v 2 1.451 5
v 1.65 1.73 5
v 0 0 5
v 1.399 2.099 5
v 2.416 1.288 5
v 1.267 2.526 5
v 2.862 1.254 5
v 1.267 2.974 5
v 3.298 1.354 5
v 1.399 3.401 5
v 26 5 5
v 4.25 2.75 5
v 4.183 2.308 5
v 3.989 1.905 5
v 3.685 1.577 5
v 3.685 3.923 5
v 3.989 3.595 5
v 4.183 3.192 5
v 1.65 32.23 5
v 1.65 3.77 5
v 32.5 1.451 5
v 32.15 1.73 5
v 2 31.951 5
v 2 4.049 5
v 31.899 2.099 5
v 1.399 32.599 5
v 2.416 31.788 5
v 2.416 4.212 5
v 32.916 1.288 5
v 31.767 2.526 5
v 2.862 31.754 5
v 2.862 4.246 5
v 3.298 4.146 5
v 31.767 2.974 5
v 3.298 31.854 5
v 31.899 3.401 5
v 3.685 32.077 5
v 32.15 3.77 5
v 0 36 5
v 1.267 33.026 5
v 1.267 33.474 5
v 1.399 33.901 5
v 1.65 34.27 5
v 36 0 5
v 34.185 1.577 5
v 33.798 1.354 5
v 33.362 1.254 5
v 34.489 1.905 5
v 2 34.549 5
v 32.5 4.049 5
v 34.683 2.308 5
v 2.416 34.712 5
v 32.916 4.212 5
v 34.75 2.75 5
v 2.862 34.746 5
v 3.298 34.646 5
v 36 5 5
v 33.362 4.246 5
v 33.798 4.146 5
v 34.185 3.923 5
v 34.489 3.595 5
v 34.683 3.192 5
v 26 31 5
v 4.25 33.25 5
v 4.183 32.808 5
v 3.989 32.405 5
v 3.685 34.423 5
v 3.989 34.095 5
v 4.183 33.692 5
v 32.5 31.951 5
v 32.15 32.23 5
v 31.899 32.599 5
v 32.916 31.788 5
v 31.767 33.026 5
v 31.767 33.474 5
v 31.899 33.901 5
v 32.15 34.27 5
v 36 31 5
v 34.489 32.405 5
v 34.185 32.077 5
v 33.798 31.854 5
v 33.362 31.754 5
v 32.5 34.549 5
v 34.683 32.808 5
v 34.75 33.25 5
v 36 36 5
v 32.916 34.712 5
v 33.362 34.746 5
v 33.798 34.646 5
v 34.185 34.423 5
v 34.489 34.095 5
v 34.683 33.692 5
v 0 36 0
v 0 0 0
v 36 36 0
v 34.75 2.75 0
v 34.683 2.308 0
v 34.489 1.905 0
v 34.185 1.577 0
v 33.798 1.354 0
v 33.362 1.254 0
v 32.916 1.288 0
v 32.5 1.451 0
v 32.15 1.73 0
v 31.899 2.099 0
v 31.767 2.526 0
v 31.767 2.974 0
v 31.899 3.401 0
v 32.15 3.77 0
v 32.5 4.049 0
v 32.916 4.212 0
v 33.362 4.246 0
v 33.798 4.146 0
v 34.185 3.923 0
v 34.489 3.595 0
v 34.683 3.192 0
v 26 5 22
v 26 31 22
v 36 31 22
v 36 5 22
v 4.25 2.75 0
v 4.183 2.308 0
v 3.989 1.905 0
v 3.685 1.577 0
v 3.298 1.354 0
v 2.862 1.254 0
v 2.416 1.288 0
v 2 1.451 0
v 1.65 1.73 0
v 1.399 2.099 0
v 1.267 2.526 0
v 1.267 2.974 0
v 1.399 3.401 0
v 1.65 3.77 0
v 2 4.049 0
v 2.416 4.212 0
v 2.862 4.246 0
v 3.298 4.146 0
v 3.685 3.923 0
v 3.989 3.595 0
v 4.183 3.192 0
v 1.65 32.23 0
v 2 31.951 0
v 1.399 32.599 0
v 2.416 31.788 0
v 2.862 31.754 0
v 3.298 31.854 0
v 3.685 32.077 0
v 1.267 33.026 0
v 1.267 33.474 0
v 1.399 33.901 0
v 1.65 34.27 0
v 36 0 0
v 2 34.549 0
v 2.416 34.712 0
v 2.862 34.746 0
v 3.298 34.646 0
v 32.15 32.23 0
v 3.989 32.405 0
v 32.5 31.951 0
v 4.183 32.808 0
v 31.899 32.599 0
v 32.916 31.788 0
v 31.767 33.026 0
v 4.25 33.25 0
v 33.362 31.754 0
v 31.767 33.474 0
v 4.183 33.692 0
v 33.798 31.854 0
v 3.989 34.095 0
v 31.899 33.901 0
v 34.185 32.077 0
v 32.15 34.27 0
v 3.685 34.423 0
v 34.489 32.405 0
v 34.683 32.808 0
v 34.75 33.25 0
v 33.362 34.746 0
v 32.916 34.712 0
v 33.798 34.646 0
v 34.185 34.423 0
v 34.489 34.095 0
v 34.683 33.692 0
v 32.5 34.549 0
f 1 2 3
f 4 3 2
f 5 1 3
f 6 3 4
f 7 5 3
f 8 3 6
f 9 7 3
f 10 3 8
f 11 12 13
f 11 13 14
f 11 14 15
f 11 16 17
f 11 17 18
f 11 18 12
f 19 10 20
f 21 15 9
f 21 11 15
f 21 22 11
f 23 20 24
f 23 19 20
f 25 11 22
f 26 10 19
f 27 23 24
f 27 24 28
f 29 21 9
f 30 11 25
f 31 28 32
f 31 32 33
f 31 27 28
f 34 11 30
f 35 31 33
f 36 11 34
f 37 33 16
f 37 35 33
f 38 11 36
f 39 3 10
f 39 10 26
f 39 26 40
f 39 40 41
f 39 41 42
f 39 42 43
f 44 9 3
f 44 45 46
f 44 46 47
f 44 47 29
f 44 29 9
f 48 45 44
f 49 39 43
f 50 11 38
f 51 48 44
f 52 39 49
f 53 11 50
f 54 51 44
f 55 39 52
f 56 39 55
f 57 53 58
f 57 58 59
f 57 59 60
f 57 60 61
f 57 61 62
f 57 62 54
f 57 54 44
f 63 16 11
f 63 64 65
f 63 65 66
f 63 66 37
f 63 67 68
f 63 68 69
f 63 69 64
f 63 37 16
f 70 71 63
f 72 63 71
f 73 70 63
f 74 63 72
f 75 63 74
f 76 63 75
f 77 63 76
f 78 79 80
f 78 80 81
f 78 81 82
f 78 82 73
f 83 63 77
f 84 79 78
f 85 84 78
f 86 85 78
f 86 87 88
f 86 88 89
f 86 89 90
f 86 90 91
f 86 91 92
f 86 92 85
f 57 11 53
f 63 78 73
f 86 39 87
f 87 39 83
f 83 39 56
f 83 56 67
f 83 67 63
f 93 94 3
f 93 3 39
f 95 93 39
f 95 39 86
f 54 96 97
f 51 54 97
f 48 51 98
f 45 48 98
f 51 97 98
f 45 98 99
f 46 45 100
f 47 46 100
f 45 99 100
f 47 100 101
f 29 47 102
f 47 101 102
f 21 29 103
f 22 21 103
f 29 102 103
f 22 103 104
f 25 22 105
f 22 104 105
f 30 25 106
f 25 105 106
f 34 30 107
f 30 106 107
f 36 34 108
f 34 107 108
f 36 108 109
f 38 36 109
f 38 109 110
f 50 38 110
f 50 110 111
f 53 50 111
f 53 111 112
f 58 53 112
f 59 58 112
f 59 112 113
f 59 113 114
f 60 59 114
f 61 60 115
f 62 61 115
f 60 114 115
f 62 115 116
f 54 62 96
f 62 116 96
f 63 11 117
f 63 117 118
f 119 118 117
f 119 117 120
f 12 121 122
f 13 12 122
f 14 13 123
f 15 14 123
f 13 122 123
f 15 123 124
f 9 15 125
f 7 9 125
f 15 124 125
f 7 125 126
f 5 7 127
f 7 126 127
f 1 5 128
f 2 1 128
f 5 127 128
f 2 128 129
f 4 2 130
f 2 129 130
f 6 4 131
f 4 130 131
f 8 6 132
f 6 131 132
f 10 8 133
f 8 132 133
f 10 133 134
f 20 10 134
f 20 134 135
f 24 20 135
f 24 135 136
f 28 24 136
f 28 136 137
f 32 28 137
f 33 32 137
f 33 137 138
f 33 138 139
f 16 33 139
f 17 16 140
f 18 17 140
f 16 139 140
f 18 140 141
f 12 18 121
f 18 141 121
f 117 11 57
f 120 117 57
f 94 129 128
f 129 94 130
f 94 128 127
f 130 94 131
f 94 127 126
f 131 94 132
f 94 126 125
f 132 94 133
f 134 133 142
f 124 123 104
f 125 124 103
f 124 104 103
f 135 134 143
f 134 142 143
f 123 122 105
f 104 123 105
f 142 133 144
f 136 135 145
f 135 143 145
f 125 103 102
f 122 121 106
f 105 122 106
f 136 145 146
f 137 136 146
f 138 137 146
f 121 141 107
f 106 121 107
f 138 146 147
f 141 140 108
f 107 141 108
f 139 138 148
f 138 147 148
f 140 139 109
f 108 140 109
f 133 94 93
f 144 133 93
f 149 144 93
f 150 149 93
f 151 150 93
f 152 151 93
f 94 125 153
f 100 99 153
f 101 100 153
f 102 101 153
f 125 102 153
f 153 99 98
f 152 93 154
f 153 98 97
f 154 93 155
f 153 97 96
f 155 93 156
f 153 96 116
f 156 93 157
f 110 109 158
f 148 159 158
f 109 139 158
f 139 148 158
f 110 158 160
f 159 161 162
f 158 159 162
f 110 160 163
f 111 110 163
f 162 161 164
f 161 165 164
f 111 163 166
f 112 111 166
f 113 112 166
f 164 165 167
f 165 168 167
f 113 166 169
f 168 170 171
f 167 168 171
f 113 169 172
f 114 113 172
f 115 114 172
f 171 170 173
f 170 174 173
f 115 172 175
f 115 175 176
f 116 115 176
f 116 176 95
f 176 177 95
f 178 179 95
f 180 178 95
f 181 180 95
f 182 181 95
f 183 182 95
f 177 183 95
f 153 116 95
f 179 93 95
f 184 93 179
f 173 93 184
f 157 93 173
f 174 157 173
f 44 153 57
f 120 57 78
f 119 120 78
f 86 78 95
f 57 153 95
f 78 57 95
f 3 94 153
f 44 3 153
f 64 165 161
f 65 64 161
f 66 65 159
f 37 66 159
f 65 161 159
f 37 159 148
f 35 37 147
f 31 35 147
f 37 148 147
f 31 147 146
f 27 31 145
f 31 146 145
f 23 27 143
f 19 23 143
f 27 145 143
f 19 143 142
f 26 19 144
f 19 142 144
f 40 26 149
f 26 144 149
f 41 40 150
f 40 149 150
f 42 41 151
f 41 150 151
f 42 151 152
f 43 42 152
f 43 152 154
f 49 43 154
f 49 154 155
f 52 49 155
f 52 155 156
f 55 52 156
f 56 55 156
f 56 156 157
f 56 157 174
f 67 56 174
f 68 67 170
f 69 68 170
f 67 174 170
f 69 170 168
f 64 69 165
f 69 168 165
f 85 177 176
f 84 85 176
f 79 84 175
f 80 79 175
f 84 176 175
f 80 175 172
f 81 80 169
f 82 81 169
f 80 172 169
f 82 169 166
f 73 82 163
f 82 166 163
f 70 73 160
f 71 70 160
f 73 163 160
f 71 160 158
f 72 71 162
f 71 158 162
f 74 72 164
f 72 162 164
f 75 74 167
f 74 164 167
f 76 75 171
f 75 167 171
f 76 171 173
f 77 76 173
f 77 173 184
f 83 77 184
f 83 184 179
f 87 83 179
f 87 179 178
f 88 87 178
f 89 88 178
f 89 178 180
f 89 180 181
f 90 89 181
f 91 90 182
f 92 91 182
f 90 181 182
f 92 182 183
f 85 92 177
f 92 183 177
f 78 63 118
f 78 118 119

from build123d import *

# Parameters (mm, degrees)
SKETCH_W     = 36
SKETCH_H     = 36
PAD_DEPTH    = 5
SKETCH001_W  = 10
SKETCH001_H  = 26
PAD001_DEPTH = 17
SKETCH002_R  = 1.5
POCKET_DEPTH = 5


with BuildPart() as part:
    # Sketch → Pad (new body)
    with BuildSketch(Plane.XY):
        with Locations((18, 18)):
            Rectangle(SKETCH_W, SKETCH_H)
    extrude(amount=PAD_DEPTH)

    # Sketch001 → Pad001 (new body)
    with BuildSketch(Plane.XY.offset(5)):
        with Locations((31, 18)):
            Rectangle(SKETCH001_W, SKETCH001_H)
    extrude(amount=PAD001_DEPTH)

    # Sketch002 → Pocket (cut)
    with BuildSketch(Plane(origin=(0, 0, 0), x_dir=(1, 0, 0), z_dir=(0, 0, -1))):
        with Locations((2.75, -2.75)):
            Circle(SKETCH002_R)
        with Locations((33.25, -2.75)):
            Circle(SKETCH002_R)
        with Locations((33.25, -33.25)):
            Circle(SKETCH002_R)
        with Locations((2.75, -33.25)):
            Circle(SKETCH002_R)
    extrude(amount=-POCKET_DEPTH, mode=Mode.SUBTRACT)


solid = part.part
